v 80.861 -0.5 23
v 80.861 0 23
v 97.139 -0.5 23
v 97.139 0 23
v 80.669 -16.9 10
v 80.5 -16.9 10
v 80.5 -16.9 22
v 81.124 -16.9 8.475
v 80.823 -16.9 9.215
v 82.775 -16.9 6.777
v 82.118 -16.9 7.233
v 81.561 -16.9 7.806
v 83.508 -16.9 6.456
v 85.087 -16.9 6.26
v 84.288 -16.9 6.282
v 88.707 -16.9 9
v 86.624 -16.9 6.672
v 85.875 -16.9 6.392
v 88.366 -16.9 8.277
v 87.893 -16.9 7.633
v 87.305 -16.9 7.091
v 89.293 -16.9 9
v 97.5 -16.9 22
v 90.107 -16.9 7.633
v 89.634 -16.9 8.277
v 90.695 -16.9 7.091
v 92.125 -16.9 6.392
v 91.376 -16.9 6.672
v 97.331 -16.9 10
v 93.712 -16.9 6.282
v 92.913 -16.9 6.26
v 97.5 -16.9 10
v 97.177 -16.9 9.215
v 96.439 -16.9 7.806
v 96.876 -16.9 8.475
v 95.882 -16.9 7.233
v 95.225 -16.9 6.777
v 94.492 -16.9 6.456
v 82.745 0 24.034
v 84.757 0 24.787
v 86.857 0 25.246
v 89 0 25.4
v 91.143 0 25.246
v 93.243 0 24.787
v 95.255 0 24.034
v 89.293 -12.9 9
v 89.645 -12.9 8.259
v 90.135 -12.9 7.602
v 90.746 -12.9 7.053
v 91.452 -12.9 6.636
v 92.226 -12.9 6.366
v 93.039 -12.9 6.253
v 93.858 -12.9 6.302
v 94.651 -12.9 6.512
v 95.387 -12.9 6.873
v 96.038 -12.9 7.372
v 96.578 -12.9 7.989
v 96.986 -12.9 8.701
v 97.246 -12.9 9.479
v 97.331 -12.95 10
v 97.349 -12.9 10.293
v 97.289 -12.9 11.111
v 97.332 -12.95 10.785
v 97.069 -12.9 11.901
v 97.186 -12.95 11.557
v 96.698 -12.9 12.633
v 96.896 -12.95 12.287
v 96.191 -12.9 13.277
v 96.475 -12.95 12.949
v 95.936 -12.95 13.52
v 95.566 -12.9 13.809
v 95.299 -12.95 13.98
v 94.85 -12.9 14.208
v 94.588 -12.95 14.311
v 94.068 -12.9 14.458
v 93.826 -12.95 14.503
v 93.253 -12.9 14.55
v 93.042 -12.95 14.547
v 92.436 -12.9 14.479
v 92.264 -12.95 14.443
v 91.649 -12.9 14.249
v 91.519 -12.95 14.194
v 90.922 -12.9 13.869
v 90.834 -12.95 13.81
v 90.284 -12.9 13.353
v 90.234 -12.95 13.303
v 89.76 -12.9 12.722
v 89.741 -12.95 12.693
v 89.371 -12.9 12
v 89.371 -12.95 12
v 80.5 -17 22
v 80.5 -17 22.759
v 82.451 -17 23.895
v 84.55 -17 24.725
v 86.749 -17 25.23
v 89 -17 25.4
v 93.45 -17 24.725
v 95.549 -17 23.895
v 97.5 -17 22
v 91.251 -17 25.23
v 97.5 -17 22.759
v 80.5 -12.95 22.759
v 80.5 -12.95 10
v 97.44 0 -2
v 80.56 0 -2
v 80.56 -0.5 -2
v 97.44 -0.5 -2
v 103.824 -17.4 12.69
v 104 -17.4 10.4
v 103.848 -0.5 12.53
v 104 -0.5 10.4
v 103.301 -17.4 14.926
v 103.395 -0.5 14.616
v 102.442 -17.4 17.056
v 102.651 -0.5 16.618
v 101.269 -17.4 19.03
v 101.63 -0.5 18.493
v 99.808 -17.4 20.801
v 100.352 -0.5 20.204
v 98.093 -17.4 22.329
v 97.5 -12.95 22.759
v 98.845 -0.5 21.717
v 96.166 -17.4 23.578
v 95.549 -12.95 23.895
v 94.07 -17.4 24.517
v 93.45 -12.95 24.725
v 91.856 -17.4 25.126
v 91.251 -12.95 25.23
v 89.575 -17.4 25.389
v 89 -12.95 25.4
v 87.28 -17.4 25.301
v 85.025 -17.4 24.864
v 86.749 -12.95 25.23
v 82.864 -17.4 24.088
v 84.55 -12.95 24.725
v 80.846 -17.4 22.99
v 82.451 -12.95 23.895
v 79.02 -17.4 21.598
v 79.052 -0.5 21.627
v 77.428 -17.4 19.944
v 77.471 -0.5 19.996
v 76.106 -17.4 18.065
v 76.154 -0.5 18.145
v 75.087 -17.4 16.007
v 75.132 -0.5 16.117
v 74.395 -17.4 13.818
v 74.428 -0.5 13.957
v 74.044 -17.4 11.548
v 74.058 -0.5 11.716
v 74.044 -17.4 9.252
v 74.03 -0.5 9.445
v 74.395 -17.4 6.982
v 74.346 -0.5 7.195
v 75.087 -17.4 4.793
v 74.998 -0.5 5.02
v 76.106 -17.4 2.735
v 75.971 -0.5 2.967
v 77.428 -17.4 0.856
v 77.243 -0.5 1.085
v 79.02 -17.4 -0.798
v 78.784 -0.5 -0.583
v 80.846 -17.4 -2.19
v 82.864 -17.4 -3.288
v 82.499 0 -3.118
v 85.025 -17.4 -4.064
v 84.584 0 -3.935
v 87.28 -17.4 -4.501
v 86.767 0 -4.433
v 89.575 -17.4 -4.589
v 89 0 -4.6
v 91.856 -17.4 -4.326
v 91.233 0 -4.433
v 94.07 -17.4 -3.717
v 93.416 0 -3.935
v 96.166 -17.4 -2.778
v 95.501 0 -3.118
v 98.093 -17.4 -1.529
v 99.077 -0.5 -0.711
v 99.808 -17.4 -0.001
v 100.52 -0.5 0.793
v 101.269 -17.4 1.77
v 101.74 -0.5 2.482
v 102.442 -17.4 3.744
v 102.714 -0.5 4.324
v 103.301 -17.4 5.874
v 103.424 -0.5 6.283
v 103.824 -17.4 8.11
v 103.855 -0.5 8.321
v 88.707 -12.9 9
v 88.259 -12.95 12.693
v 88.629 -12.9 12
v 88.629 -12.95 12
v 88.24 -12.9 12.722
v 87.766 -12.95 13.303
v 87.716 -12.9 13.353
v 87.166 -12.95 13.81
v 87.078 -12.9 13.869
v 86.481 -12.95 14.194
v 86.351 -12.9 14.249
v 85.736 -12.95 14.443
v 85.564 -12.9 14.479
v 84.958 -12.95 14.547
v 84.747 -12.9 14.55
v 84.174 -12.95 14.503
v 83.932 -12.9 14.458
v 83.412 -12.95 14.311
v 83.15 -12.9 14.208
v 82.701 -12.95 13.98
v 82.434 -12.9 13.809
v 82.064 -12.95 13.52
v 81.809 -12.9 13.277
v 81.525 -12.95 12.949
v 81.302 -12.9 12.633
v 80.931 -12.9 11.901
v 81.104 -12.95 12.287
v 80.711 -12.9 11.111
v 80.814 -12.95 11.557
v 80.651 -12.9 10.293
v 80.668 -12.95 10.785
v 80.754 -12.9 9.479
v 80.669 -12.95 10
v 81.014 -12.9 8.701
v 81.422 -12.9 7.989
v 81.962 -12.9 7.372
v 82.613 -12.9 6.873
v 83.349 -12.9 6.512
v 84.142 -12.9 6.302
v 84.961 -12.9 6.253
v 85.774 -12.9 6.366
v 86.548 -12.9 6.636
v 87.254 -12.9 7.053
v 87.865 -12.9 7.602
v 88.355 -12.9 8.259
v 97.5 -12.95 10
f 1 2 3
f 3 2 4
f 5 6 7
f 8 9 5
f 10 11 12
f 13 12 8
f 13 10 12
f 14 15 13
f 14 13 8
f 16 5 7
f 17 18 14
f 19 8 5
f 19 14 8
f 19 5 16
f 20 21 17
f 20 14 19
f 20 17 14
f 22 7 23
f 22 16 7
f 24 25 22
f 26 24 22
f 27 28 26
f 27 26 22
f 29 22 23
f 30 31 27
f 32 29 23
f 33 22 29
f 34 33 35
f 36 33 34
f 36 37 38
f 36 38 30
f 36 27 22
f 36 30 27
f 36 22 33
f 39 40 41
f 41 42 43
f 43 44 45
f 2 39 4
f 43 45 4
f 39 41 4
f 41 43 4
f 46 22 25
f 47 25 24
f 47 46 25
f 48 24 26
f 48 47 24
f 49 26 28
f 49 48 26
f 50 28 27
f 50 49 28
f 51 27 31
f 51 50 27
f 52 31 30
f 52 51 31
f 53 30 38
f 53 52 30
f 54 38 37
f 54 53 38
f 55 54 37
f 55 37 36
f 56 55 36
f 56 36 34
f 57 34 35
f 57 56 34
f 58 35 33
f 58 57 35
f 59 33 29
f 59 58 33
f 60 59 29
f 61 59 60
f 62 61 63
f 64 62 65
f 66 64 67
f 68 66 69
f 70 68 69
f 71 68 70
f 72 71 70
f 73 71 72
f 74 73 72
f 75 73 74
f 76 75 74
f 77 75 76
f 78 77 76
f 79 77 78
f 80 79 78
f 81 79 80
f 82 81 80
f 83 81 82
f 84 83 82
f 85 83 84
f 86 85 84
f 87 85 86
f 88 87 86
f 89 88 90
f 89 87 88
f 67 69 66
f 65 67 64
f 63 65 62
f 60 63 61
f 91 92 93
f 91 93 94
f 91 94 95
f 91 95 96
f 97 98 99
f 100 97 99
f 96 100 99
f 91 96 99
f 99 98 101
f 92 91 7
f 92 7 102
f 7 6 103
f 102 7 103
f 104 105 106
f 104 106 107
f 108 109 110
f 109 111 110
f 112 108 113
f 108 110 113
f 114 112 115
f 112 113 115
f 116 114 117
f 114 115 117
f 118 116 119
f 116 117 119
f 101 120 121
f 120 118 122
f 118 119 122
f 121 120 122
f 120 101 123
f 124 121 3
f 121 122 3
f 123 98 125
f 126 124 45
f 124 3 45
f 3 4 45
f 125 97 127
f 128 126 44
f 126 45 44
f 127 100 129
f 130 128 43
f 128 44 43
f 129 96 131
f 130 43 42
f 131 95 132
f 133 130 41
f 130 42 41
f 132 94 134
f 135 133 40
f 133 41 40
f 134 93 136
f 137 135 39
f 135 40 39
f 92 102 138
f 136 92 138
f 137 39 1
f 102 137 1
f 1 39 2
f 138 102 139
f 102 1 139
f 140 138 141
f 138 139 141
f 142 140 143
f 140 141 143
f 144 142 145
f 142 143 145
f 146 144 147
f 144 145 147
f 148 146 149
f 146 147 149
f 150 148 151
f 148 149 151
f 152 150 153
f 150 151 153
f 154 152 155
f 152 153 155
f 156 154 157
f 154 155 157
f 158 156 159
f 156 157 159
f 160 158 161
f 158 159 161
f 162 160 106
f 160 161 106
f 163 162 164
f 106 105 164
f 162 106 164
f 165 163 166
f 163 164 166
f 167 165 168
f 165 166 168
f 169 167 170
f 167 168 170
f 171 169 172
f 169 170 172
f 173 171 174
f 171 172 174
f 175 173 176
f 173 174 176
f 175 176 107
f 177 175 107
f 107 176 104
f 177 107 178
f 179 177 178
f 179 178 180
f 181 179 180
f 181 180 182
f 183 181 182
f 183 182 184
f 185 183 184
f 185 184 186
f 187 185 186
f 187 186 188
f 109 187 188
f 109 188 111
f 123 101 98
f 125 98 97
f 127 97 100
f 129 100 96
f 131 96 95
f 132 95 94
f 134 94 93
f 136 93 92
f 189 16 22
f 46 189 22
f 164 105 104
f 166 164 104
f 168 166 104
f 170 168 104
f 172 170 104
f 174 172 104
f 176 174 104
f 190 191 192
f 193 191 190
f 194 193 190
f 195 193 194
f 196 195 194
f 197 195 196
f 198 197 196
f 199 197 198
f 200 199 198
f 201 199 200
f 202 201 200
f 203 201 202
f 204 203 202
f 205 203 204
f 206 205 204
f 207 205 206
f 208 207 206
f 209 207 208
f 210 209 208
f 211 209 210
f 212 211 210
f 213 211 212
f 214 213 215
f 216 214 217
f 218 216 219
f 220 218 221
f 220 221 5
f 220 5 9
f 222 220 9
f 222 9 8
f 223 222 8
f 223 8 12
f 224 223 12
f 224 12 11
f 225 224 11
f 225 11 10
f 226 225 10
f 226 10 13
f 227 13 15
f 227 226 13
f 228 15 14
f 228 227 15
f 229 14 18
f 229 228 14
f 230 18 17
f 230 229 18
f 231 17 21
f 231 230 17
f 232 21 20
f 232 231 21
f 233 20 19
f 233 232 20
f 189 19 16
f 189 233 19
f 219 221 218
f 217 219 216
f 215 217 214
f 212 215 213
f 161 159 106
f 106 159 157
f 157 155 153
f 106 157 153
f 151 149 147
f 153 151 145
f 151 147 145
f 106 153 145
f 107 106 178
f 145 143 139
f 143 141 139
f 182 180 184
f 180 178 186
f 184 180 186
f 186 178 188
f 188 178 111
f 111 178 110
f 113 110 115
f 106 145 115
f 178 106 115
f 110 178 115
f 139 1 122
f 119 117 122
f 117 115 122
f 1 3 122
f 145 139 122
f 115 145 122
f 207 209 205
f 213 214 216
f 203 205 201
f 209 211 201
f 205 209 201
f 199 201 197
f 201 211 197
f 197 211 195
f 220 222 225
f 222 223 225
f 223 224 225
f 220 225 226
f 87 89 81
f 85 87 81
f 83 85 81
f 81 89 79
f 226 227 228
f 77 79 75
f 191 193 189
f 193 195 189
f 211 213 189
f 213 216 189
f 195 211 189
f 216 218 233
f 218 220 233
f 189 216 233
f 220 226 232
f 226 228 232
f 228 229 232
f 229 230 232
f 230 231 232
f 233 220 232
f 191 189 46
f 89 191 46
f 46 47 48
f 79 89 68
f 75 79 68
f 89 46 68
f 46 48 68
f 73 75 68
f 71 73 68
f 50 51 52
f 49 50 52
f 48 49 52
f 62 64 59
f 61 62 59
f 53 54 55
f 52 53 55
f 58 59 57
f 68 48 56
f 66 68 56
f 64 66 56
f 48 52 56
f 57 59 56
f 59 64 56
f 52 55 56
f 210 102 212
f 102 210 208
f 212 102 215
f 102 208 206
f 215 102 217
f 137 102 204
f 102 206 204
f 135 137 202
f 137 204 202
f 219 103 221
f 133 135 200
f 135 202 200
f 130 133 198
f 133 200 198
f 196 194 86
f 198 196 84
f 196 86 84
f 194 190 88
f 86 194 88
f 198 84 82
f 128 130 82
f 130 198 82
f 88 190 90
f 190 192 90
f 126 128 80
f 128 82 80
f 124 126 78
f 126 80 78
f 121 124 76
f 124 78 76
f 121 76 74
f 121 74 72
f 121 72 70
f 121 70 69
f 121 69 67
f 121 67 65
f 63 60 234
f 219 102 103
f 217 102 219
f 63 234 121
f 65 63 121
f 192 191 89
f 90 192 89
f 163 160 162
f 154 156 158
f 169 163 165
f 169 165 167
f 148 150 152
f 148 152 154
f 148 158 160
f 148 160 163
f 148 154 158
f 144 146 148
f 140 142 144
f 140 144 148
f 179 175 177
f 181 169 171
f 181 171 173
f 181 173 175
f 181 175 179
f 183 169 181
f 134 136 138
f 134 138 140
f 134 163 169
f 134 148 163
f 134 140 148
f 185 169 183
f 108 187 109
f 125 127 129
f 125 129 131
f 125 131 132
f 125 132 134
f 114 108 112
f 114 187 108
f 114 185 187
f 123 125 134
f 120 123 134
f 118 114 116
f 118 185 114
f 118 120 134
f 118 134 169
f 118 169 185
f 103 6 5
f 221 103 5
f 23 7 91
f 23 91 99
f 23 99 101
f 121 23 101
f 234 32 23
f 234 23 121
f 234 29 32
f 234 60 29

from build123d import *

# Parameters (mm, degrees)
SKETCH007_R         = 15
EXTRUDE003004_DEPTH = 0.4
BOX019_W            = 17
BOX019_H            = 0.4
BOX019_DEPTH        = 20
BOX018_W            = 17
BOX018_H            = 4.35
BOX018_DEPTH        = 28
BOX013_W            = 1
BOX013_H            = 5.2
BOX013_DEPTH        = 3
CYLINDER009_R       = 4.15
CYLINDER009_DEPTH   = 10
CYLINDER007_R       = 4.15
CYLINDER007_DEPTH   = 10
BOX007_W            = 50
BOX007_H            = 25
BOX007_DEPTH        = 0.5
SKETCH006_R         = 15
EXTRUDE003003_DEPTH = 17.25


with BuildPart() as extrude003004:
    # Sketch007 → Extrude003004 (new body)
    with BuildSketch(Plane.XZ):
        with Locations((89, 10.4)):
            Circle(SKETCH007_R)
    extrude(amount=EXTRUDE003004_DEPTH)


with BuildPart() as extrude003004_1:
    # Extrude003004 placement: moved
    add(extrude003004.part.moved(Location((0, -17, 0))))


with BuildPart() as cube016:
    # Box019 → Box019 (new body)
    with BuildSketch(Plane(origin=(80.5, -17.3, 2), x_dir=(1, 0, 0), z_dir=(0, 0, 1))):
        with Locations((8.5, 0.2)):
            Rectangle(BOX019_W, BOX019_H)
    extrude(amount=BOX019_DEPTH)


with BuildPart() as cube015:
    # Box018 → Box018 (new body)
    with BuildSketch(Plane(origin=(80.5, -17.3, 10), x_dir=(1, 0, 0), z_dir=(0, 0, 1))):
        with Locations((8.5, 2.175)):
            Rectangle(BOX018_W, BOX018_H)
    extrude(amount=BOX018_DEPTH)


with BuildPart() as cube012:
    # Box013 → Box013 (new body)
    with BuildSketch(Plane(origin=(88.5, -18.1, 9), x_dir=(1, 0, 0), z_dir=(0, 0, 1))):
        with Locations((0.5, 2.6)):
            Rectangle(BOX013_W, BOX013_H)
    extrude(amount=BOX013_DEPTH)


with BuildPart() as iman_chico_fuerte003:
    # Cylinder009 → Cylinder009 (new body)
    with BuildSketch(Plane(origin=(93.2, -12.9, 10.4), x_dir=(1, 0, 0), z_dir=(0, -1, 0))):
        Circle(CYLINDER009_R)
    extrude(amount=CYLINDER009_DEPTH)


with BuildPart() as iman_chico_fuerte001:
    # Cylinder007 → Cylinder007 (new body)
    with BuildSketch(Plane(origin=(84.8, -12.9, 10.4), x_dir=(1, 0, 0), z_dir=(0, -1, 0))):
        Circle(CYLINDER007_R)
    extrude(amount=CYLINDER007_DEPTH)


with BuildPart() as cube007:
    # Box007 → Box007 (new body)
    with BuildSketch(Plane(origin=(66, 0, -2), x_dir=(1, 0, 0), z_dir=(0, -1, 0))):
        with Locations((25, 12.5)):
            Rectangle(BOX007_W, BOX007_H)
    extrude(amount=BOX007_DEPTH)


with BuildPart() as pared_2_iman_fuerte_interno_sin_tapa:
    # Sketch006 → Extrude003003 (new body)
    with BuildSketch(Plane.XZ):
        with Locations((89, 10.4)):
            Circle(SKETCH006_R)
    extrude(amount=EXTRUDE003003_DEPTH)

    # Cut005014006: cut Cube007
    add(cube007.part, mode=Mode.SUBTRACT)

    # Cut005014007: cut iman_chico_fuerte001
    add(iman_chico_fuerte001.part, mode=Mode.SUBTRACT)

    # Cut005014010: cut iman_chico_fuerte003
    add(iman_chico_fuerte003.part, mode=Mode.SUBTRACT)

    # Cut005014011: cut Cube012
    add(cube012.part, mode=Mode.SUBTRACT)

    # Cut005014013: cut Cube015
    add(cube015.part, mode=Mode.SUBTRACT)

    # Fusion007: union Cube016
    add(cube016.part)

    # Fusion008: union Extrude003004
    add(extrude003004_1.part)


solid = pared_2_iman_fuerte_interno_sin_tapa.part
